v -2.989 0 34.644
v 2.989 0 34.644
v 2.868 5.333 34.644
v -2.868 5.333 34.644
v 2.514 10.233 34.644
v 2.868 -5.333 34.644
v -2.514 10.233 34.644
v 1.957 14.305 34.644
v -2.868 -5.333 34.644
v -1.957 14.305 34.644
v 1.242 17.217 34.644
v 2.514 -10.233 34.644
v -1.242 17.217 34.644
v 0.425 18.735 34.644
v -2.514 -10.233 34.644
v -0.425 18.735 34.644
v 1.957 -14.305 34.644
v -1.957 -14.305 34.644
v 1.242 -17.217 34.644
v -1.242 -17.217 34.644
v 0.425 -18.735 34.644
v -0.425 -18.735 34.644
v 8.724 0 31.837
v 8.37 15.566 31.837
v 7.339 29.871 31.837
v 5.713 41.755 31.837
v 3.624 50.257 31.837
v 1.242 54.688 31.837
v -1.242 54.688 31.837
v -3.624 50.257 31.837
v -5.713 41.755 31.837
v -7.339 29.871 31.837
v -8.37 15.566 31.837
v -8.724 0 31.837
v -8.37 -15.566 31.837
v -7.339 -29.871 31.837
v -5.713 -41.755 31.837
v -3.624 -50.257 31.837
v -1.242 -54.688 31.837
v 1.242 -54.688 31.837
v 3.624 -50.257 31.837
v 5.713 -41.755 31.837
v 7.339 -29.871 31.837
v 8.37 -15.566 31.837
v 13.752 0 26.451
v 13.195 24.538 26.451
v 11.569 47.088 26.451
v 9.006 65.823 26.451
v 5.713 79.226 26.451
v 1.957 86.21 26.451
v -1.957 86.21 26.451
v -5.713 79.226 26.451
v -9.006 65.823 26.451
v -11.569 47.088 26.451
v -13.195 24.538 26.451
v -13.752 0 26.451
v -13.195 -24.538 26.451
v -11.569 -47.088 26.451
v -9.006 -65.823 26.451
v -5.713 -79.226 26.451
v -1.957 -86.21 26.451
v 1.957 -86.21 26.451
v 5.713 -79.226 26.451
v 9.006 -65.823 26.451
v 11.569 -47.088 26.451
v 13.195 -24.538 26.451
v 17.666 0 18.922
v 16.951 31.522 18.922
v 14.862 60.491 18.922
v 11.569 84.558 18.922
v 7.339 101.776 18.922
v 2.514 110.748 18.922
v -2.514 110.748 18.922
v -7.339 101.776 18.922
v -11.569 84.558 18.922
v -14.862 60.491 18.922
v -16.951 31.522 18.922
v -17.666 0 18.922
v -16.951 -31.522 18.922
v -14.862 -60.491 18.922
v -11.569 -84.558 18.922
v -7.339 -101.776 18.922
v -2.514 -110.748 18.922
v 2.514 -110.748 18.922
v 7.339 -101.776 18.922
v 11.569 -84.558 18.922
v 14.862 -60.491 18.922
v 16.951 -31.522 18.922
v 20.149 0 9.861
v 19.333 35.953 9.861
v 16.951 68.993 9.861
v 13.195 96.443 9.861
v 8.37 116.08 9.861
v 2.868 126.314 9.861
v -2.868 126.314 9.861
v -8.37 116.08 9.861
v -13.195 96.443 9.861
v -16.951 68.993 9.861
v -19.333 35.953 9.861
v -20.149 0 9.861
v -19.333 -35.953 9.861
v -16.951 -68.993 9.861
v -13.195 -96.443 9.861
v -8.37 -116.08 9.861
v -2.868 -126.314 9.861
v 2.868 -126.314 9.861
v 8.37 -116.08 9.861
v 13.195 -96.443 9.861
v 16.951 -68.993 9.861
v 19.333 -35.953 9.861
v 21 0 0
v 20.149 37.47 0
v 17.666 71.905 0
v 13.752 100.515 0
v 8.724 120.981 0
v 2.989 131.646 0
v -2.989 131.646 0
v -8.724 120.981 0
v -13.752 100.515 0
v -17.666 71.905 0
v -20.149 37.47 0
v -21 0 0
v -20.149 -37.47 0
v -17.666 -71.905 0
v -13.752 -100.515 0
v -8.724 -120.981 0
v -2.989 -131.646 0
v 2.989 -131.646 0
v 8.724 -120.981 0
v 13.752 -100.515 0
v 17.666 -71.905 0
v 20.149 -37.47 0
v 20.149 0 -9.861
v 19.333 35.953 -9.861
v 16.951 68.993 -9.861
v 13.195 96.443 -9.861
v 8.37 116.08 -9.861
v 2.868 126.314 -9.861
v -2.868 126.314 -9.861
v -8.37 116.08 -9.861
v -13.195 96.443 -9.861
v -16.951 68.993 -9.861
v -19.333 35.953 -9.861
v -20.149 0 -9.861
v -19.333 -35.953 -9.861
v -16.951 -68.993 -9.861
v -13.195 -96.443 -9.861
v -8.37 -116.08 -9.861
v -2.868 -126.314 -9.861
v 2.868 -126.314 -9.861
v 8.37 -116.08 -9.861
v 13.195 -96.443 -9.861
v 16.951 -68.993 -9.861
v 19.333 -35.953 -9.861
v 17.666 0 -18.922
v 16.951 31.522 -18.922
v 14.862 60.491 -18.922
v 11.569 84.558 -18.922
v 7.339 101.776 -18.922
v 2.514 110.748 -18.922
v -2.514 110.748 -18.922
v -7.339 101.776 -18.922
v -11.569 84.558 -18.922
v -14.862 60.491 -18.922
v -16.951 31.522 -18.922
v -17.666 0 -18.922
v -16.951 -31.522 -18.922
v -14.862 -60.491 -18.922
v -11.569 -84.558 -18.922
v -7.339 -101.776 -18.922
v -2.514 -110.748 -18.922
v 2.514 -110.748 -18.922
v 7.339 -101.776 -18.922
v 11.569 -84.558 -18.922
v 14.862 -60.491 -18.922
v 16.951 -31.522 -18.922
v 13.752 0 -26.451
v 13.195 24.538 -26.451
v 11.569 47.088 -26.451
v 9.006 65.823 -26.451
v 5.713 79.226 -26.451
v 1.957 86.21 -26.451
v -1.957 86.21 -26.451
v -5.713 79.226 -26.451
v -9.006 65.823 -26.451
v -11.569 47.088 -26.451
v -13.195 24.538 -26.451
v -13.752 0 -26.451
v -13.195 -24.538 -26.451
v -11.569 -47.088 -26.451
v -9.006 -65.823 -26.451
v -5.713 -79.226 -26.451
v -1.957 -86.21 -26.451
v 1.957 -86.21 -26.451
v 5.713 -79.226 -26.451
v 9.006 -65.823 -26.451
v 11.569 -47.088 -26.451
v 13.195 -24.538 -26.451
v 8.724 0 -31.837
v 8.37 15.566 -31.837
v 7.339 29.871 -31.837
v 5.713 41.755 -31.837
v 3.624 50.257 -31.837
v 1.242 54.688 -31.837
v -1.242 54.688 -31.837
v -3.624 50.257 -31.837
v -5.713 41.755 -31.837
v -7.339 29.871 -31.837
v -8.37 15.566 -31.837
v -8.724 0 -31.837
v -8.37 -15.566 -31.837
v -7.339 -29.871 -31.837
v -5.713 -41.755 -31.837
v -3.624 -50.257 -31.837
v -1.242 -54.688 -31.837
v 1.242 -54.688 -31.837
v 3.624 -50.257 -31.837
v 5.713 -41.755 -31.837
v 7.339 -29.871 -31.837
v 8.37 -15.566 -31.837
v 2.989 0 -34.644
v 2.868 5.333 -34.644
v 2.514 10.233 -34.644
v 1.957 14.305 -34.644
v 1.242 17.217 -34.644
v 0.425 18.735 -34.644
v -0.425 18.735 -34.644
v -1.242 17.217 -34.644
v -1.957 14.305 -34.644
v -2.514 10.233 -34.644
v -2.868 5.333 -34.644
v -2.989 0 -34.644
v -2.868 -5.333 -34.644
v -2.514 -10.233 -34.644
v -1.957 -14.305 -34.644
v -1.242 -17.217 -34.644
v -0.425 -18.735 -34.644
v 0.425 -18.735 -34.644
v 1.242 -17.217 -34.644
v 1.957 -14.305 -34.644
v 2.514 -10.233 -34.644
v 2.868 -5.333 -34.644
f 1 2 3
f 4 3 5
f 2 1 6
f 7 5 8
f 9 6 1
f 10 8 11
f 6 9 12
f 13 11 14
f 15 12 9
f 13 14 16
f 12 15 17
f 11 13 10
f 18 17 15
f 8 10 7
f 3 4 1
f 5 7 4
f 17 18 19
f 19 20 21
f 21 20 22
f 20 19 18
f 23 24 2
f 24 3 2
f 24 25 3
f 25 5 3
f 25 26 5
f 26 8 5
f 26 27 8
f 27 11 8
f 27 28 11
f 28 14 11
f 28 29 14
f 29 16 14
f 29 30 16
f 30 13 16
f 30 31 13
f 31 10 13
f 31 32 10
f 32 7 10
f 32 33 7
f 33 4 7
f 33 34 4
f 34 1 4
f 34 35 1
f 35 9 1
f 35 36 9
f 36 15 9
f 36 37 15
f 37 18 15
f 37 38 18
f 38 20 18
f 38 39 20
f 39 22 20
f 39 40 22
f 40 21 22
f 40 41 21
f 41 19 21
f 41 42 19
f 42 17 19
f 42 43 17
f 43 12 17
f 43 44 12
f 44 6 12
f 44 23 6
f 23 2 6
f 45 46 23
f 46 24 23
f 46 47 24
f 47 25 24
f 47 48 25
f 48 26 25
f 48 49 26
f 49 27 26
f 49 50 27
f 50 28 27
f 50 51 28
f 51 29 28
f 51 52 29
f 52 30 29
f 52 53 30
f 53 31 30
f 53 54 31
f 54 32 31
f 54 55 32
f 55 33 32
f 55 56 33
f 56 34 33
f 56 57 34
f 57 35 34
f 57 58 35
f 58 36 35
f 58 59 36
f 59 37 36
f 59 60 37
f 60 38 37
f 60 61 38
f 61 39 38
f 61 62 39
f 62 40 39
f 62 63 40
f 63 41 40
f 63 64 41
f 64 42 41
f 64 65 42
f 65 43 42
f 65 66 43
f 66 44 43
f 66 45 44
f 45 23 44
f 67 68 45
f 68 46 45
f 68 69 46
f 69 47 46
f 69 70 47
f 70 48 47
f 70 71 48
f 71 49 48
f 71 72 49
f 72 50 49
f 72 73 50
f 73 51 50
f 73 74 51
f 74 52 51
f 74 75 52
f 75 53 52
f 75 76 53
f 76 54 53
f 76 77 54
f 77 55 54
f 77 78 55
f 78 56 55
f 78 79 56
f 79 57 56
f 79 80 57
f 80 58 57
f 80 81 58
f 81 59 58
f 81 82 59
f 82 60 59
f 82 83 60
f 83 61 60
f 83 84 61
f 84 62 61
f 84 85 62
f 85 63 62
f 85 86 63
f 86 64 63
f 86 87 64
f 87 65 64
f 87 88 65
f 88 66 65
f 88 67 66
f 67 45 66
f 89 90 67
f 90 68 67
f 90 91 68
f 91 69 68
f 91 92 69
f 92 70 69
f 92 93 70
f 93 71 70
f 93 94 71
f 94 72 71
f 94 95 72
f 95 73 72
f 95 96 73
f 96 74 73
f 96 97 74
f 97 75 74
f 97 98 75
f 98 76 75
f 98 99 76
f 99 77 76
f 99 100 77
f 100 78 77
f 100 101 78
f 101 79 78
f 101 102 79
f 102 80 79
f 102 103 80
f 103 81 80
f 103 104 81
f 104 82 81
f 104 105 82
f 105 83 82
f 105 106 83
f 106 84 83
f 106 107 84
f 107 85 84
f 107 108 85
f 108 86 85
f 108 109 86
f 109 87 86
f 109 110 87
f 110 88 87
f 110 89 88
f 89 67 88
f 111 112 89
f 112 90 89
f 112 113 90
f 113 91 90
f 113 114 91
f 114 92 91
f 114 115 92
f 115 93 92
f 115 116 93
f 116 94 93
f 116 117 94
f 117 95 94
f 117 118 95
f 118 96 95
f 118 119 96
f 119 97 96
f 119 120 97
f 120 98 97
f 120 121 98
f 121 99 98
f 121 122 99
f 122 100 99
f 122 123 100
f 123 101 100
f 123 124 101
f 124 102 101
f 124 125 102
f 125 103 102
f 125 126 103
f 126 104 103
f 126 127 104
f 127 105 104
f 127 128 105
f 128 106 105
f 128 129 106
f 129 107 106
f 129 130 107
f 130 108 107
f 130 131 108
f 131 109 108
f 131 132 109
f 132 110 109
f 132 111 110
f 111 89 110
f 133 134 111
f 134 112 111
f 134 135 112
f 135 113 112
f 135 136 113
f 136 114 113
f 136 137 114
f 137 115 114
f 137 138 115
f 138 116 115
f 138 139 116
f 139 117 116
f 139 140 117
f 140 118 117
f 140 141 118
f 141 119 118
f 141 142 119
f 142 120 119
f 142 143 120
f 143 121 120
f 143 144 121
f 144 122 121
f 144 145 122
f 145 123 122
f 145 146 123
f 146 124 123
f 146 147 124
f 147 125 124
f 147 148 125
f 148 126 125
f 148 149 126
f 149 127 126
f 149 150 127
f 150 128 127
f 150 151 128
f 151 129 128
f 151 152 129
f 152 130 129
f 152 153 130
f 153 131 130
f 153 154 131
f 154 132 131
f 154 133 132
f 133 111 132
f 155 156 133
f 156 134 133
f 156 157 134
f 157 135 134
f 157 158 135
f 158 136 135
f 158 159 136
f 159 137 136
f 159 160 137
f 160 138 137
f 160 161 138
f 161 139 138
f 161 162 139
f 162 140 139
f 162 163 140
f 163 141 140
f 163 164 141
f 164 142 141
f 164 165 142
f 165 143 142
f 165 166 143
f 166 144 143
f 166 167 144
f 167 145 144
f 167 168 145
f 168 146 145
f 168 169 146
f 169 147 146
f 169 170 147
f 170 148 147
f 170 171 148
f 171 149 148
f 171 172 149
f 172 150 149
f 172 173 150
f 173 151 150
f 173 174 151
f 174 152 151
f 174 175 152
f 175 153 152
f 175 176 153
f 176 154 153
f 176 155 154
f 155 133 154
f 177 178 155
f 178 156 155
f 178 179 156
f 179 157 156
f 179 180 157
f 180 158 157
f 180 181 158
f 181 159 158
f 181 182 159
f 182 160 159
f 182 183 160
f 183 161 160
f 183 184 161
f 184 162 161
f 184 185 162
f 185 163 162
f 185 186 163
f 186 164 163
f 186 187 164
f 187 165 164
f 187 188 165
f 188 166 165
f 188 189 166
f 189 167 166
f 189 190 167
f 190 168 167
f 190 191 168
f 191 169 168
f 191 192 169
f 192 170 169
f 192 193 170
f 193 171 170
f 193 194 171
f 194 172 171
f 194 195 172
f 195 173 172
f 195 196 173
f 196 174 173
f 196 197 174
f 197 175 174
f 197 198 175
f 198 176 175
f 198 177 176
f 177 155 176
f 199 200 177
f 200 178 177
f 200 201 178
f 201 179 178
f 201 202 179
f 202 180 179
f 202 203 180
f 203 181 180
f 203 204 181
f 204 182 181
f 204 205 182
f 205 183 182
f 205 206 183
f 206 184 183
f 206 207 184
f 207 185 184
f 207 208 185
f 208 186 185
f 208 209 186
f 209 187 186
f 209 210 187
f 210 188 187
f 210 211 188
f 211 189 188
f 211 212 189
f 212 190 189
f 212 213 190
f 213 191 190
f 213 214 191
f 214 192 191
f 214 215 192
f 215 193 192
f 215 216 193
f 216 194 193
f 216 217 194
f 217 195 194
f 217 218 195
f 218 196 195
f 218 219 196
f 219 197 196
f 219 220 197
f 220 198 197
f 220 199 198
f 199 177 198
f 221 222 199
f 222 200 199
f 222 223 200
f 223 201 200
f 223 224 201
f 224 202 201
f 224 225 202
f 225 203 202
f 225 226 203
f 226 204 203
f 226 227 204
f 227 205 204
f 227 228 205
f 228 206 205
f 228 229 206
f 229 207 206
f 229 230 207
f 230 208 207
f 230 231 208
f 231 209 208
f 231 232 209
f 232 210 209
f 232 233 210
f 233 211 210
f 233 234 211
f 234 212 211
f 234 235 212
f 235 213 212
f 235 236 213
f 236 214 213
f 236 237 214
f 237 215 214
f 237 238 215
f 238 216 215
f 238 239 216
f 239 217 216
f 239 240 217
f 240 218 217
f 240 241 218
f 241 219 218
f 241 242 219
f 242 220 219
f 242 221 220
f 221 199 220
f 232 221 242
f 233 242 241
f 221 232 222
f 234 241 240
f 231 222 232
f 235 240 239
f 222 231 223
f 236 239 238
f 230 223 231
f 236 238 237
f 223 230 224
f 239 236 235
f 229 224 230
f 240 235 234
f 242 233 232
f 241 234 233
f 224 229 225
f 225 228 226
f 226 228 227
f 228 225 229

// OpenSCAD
// Generated by SolidPython 1.0.1 on 2020-07-29 00:46:46


scale(v = [3, 19, 5]) {
	sphere(r = 7);
}
/***********************************************
*********      SolidPython code:      **********
************************************************
 
# import packages: SolidPython
from solid import *
from solid.utils import *
from itertools import chain, combinations, permutations


class Resize:

    def __init__(self, scad_file):
        self.scad_file = scad_file
        #self.scad_file = import_scad(scad_file)
        # cone/cylinder param:
        self.r1 = 0
        self.r2 = 0
        self.h = 0
        # rectangular prism param:
        self.w = 0
        self.l = 0
        # ellipse param:
        self.r = 0

    # import OpenScad code (file name corresponds to shape)


    # classify shape + parameters
    def assign(self, param1, param2, param3):
        if self.scad_file == 'cone.scad':
            self.r1 = param1
            self.r2 = param2
            self.h = param3
        elif self.scad_file == 'cylinder.scad':
            self.r1 = param1
            self.r2 = param2
            self.h = param3
        elif self.scad_file == 'rectangularPrism.scad':
            self.h = param1
            self.l = param2
            self.w = param3
        else:
            self.r = param1
            self.h = param2

    # resize parameters
    def iterate(self):
        x = range(3, 20, 2)
        i = 1
        if self.scad_file == 'cone.scad':
            tempList = list(permutations(x, 2))
            for temp in tempList:
                param1 = temp[0]
                param2 = temp[1]
                filepath = 'produced_scad_files/' + 'cone' + str(param1) + '_' + str(param2) + '_' + '.scad'
                scad_render_to_file(cylinder(h=param1, r1=param2, r2=0), filepath)

        elif self.scad_file == 'cylinder.scad':
            tempList = list(permutations(x, 3))
            for temp in tempList:
                param1 = temp[0]
                param2 = temp[1]
                filepath = 'produced_scad_files/' + 'cylinder' + str(param1) + '_' + str(param2) + '_' + '.scad'
                scad_render_to_file(cylinder(h=param1, r1=param2, r2=param2), filepath)

        elif self.scad_file == 'rectangularPrism.scad':
            tempList = list(permutations(x, 3))
            for temp in tempList:
                param1 = temp[0]
                param2 = temp[1]
                param3 = temp[2]
                filepath = 'produced_scad_files/' + 'rectangularPrism' + str(param1) + '_' + str(param2) + '_' + str(
                    param3) + '.scad'
                scad_render_to_file(cube(size=(param1, param2, param3)), filepath)

        elif self.scad_file == 'ellipse.scad':
            tempList = list(permutations(x, 4))
            for temp in tempList:
                param1 = temp[0]
                param2 = temp[1]
                param3 = temp[2]
                param4 = temp[3]
                filepath = 'produced_scad_files/' + 'ellipse' + str(param1) + '_' + str(param2) + '_' + str(param3) + '_' + str(param4) + '.scad'
                scad_render_to_file(scale([param1, param2, param3])(sphere(r=param4)), filepath)

    def render_to_scadfile(self):
        scad_render_to_file(scad, 'example.scad') 
 
************************************************/
